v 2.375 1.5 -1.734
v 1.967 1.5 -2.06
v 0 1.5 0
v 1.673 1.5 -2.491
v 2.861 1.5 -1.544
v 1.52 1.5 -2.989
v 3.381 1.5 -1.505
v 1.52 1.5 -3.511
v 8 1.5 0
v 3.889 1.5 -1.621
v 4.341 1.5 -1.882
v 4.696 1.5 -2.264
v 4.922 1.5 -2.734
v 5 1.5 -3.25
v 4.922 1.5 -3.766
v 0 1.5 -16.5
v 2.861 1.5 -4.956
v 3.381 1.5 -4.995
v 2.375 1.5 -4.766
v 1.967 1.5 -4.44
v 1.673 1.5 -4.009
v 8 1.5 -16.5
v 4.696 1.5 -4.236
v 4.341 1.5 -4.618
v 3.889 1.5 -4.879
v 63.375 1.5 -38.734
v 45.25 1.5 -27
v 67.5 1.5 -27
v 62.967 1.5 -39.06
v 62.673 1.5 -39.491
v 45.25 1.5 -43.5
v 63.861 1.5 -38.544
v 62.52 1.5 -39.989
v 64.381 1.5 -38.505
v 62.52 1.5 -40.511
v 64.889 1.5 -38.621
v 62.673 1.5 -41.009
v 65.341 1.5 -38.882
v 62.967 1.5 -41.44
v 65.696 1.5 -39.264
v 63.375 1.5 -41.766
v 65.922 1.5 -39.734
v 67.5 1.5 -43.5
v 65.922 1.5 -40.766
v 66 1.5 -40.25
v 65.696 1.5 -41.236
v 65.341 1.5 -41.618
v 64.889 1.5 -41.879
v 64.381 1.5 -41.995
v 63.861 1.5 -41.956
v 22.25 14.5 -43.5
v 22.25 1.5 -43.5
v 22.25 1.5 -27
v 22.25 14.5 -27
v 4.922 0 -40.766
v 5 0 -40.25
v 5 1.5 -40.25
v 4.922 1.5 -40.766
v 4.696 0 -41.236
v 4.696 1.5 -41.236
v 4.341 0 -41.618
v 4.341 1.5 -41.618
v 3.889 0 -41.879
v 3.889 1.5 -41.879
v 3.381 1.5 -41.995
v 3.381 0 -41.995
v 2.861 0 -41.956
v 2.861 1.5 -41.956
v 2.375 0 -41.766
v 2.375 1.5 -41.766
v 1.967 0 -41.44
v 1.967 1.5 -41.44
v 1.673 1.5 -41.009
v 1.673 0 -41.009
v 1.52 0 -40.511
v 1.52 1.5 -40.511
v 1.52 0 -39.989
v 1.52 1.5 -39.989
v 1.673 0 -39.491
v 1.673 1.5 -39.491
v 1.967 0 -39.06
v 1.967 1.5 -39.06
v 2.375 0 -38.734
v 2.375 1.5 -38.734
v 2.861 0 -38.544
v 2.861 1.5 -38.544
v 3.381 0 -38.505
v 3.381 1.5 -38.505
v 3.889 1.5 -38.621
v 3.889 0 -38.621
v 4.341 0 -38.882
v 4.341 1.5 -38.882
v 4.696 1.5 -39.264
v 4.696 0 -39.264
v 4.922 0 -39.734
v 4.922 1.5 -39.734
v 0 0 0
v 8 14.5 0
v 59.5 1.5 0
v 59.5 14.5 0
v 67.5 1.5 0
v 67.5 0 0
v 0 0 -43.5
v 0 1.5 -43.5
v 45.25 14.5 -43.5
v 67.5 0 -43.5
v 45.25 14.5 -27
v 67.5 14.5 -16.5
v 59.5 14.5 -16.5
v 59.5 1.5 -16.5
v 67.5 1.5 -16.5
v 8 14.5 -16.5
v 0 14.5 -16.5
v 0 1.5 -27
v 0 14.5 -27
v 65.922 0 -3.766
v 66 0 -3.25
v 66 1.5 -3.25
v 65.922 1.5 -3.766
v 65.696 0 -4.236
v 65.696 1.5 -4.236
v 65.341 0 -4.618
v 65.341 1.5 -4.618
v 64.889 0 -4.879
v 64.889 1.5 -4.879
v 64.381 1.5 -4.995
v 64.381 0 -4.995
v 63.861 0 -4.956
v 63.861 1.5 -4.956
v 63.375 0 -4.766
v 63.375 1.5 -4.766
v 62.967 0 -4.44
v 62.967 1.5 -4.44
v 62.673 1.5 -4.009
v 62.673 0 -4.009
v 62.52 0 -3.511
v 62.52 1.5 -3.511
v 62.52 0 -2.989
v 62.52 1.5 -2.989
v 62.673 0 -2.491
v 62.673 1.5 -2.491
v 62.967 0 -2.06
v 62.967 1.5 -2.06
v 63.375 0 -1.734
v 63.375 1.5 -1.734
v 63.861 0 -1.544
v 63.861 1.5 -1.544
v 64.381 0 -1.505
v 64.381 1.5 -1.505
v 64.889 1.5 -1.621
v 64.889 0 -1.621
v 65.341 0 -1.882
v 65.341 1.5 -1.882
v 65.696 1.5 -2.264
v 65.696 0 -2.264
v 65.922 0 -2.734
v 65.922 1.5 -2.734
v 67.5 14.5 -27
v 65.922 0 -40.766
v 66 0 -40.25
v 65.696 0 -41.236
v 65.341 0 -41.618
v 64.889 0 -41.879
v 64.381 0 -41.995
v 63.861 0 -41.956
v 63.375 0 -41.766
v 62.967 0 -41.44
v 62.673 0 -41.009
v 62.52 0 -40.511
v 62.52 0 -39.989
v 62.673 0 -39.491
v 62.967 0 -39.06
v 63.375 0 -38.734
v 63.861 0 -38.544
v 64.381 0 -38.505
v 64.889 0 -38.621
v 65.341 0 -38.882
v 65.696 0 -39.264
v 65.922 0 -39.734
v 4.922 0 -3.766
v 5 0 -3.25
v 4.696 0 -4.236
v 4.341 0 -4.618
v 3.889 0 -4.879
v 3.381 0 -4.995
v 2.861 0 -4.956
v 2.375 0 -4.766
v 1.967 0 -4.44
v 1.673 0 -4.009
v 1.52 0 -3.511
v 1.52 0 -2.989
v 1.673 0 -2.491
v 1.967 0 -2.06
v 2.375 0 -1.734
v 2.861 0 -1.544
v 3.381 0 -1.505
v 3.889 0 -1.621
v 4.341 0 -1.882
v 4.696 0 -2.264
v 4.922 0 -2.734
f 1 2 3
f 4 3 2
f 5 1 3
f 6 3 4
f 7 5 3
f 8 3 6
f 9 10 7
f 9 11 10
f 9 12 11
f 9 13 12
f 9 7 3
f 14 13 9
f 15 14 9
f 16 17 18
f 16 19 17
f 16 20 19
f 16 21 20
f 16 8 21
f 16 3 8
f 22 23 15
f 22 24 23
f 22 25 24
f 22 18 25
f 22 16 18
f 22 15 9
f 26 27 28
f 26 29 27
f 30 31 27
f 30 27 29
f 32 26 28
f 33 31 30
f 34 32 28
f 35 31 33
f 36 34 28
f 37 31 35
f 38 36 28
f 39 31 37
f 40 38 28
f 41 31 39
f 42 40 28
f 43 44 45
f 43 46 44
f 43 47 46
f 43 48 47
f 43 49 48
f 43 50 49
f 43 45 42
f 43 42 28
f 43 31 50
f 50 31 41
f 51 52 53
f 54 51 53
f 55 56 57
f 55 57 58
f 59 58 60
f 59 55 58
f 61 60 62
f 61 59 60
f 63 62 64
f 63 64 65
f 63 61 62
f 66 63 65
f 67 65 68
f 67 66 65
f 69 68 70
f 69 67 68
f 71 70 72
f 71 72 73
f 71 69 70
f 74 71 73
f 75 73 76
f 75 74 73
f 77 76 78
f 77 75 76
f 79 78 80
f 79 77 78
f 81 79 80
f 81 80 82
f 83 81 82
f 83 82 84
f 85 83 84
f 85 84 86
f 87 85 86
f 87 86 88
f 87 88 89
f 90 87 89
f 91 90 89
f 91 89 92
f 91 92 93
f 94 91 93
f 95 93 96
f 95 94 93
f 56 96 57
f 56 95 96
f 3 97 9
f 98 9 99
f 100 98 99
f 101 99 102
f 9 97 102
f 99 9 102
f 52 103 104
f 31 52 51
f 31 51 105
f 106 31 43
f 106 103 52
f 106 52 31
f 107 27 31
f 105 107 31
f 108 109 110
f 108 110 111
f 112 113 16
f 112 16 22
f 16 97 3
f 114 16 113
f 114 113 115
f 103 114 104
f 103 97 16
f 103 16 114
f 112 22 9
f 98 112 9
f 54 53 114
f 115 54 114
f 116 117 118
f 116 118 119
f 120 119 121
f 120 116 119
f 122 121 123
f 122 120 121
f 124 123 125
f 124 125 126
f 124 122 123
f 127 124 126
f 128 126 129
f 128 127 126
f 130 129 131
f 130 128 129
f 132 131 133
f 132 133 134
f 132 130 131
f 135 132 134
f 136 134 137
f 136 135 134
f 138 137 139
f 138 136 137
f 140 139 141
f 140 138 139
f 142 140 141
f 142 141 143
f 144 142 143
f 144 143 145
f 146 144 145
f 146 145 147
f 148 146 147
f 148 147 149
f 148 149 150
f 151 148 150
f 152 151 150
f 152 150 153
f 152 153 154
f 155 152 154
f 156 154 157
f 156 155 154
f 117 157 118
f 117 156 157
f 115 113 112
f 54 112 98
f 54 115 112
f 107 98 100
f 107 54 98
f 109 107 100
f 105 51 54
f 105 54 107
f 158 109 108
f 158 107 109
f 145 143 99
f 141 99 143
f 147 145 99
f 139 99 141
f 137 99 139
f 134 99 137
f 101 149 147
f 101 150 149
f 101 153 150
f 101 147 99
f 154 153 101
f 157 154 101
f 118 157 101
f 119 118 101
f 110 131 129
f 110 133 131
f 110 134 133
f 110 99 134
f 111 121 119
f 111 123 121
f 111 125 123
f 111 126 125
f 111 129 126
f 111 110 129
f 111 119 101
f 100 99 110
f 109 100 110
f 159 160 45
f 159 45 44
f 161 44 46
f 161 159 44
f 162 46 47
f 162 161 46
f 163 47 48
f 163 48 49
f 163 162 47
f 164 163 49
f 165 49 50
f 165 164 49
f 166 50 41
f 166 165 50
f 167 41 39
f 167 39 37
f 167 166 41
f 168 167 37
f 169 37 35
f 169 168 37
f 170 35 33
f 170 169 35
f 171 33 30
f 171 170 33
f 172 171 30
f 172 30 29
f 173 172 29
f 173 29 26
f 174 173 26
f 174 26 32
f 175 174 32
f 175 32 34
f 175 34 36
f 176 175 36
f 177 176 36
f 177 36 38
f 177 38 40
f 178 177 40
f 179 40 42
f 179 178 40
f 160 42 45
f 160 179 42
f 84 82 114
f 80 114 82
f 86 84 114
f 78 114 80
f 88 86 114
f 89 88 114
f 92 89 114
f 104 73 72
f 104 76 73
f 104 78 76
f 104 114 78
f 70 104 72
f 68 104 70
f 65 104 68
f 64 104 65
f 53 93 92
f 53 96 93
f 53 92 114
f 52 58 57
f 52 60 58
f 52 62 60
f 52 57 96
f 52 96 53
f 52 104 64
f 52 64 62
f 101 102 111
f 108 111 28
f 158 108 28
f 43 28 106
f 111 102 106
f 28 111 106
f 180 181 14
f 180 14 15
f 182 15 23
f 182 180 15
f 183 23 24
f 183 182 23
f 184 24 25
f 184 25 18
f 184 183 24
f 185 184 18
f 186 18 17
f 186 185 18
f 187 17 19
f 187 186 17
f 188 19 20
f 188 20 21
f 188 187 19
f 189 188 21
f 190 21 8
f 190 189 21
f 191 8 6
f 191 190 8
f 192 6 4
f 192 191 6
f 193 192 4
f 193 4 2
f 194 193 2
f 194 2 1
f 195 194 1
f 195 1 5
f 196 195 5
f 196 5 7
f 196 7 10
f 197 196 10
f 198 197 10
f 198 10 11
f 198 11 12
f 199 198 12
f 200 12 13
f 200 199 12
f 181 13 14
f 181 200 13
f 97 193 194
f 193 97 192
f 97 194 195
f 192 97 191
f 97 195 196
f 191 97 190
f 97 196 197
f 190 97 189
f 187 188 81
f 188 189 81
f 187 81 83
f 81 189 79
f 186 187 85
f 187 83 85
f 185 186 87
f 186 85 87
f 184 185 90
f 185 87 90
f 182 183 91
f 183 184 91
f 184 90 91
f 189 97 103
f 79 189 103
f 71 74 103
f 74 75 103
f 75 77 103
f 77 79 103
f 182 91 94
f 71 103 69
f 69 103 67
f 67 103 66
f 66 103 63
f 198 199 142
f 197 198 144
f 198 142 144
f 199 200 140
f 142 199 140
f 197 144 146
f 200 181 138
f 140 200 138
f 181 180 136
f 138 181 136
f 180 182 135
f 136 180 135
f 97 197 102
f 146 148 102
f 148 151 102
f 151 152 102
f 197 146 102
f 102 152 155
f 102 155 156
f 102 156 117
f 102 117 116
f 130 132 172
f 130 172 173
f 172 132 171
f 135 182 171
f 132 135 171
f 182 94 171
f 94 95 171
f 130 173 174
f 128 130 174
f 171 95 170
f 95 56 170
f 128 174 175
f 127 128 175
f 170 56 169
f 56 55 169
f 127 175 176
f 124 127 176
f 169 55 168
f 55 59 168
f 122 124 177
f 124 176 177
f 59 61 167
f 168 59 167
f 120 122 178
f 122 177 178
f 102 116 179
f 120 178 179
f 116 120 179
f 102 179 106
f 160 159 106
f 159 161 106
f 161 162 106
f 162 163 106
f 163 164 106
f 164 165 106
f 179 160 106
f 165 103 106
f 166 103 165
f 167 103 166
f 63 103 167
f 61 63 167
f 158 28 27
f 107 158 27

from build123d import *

# Parameters (mm, degrees)
ESQUISSE1_W        = 67.5
ESQUISSE1_H        = 43.5
ESQUISSE1_R        = 1.75
BOSS_EXTRU_1_DEPTH = 1.5
BOSS_EXTRU_2_DEPTH = 13


with BuildPart() as part:
    # Esquisse1 → Boss.-Extru.1 (new body)
    with BuildSketch(Plane(origin=(0, 0, 0), x_dir=(1, 0, 0), z_dir=(0, 1, 0))):
        with Locations((33.75, 21.75)):
            Rectangle(ESQUISSE1_W, ESQUISSE1_H)
        with Locations((3.25, 40.25)):
            Circle(ESQUISSE1_R, mode=Mode.SUBTRACT)
        with Locations((64.25, 40.25)):
            Circle(ESQUISSE1_R, mode=Mode.SUBTRACT)
        with Locations((64.25, 3.25)):
            Circle(ESQUISSE1_R, mode=Mode.SUBTRACT)
        with Locations((3.25, 3.25)):
            Circle(ESQUISSE1_R, mode=Mode.SUBTRACT)
    extrude(amount=BOSS_EXTRU_1_DEPTH)

    # Esquisse3 → Boss.-Extru.2 (add)
    with BuildSketch(Plane(origin=(0, 1.5, 0), x_dir=(1, 0, 0), z_dir=(0, 1, 0))):
        Polygon((45.25, 43.5), (22.25, 43.5), (22.25, 27), (0, 27), (0, 16.5), (8, 16.5), (8, 0), (59.5, 0), (59.5, 16.5), (67.5, 16.5), (67.5, 27), (45.25, 27), align=None)
    extrude(amount=BOSS_EXTRU_2_DEPTH)


solid = part.part
